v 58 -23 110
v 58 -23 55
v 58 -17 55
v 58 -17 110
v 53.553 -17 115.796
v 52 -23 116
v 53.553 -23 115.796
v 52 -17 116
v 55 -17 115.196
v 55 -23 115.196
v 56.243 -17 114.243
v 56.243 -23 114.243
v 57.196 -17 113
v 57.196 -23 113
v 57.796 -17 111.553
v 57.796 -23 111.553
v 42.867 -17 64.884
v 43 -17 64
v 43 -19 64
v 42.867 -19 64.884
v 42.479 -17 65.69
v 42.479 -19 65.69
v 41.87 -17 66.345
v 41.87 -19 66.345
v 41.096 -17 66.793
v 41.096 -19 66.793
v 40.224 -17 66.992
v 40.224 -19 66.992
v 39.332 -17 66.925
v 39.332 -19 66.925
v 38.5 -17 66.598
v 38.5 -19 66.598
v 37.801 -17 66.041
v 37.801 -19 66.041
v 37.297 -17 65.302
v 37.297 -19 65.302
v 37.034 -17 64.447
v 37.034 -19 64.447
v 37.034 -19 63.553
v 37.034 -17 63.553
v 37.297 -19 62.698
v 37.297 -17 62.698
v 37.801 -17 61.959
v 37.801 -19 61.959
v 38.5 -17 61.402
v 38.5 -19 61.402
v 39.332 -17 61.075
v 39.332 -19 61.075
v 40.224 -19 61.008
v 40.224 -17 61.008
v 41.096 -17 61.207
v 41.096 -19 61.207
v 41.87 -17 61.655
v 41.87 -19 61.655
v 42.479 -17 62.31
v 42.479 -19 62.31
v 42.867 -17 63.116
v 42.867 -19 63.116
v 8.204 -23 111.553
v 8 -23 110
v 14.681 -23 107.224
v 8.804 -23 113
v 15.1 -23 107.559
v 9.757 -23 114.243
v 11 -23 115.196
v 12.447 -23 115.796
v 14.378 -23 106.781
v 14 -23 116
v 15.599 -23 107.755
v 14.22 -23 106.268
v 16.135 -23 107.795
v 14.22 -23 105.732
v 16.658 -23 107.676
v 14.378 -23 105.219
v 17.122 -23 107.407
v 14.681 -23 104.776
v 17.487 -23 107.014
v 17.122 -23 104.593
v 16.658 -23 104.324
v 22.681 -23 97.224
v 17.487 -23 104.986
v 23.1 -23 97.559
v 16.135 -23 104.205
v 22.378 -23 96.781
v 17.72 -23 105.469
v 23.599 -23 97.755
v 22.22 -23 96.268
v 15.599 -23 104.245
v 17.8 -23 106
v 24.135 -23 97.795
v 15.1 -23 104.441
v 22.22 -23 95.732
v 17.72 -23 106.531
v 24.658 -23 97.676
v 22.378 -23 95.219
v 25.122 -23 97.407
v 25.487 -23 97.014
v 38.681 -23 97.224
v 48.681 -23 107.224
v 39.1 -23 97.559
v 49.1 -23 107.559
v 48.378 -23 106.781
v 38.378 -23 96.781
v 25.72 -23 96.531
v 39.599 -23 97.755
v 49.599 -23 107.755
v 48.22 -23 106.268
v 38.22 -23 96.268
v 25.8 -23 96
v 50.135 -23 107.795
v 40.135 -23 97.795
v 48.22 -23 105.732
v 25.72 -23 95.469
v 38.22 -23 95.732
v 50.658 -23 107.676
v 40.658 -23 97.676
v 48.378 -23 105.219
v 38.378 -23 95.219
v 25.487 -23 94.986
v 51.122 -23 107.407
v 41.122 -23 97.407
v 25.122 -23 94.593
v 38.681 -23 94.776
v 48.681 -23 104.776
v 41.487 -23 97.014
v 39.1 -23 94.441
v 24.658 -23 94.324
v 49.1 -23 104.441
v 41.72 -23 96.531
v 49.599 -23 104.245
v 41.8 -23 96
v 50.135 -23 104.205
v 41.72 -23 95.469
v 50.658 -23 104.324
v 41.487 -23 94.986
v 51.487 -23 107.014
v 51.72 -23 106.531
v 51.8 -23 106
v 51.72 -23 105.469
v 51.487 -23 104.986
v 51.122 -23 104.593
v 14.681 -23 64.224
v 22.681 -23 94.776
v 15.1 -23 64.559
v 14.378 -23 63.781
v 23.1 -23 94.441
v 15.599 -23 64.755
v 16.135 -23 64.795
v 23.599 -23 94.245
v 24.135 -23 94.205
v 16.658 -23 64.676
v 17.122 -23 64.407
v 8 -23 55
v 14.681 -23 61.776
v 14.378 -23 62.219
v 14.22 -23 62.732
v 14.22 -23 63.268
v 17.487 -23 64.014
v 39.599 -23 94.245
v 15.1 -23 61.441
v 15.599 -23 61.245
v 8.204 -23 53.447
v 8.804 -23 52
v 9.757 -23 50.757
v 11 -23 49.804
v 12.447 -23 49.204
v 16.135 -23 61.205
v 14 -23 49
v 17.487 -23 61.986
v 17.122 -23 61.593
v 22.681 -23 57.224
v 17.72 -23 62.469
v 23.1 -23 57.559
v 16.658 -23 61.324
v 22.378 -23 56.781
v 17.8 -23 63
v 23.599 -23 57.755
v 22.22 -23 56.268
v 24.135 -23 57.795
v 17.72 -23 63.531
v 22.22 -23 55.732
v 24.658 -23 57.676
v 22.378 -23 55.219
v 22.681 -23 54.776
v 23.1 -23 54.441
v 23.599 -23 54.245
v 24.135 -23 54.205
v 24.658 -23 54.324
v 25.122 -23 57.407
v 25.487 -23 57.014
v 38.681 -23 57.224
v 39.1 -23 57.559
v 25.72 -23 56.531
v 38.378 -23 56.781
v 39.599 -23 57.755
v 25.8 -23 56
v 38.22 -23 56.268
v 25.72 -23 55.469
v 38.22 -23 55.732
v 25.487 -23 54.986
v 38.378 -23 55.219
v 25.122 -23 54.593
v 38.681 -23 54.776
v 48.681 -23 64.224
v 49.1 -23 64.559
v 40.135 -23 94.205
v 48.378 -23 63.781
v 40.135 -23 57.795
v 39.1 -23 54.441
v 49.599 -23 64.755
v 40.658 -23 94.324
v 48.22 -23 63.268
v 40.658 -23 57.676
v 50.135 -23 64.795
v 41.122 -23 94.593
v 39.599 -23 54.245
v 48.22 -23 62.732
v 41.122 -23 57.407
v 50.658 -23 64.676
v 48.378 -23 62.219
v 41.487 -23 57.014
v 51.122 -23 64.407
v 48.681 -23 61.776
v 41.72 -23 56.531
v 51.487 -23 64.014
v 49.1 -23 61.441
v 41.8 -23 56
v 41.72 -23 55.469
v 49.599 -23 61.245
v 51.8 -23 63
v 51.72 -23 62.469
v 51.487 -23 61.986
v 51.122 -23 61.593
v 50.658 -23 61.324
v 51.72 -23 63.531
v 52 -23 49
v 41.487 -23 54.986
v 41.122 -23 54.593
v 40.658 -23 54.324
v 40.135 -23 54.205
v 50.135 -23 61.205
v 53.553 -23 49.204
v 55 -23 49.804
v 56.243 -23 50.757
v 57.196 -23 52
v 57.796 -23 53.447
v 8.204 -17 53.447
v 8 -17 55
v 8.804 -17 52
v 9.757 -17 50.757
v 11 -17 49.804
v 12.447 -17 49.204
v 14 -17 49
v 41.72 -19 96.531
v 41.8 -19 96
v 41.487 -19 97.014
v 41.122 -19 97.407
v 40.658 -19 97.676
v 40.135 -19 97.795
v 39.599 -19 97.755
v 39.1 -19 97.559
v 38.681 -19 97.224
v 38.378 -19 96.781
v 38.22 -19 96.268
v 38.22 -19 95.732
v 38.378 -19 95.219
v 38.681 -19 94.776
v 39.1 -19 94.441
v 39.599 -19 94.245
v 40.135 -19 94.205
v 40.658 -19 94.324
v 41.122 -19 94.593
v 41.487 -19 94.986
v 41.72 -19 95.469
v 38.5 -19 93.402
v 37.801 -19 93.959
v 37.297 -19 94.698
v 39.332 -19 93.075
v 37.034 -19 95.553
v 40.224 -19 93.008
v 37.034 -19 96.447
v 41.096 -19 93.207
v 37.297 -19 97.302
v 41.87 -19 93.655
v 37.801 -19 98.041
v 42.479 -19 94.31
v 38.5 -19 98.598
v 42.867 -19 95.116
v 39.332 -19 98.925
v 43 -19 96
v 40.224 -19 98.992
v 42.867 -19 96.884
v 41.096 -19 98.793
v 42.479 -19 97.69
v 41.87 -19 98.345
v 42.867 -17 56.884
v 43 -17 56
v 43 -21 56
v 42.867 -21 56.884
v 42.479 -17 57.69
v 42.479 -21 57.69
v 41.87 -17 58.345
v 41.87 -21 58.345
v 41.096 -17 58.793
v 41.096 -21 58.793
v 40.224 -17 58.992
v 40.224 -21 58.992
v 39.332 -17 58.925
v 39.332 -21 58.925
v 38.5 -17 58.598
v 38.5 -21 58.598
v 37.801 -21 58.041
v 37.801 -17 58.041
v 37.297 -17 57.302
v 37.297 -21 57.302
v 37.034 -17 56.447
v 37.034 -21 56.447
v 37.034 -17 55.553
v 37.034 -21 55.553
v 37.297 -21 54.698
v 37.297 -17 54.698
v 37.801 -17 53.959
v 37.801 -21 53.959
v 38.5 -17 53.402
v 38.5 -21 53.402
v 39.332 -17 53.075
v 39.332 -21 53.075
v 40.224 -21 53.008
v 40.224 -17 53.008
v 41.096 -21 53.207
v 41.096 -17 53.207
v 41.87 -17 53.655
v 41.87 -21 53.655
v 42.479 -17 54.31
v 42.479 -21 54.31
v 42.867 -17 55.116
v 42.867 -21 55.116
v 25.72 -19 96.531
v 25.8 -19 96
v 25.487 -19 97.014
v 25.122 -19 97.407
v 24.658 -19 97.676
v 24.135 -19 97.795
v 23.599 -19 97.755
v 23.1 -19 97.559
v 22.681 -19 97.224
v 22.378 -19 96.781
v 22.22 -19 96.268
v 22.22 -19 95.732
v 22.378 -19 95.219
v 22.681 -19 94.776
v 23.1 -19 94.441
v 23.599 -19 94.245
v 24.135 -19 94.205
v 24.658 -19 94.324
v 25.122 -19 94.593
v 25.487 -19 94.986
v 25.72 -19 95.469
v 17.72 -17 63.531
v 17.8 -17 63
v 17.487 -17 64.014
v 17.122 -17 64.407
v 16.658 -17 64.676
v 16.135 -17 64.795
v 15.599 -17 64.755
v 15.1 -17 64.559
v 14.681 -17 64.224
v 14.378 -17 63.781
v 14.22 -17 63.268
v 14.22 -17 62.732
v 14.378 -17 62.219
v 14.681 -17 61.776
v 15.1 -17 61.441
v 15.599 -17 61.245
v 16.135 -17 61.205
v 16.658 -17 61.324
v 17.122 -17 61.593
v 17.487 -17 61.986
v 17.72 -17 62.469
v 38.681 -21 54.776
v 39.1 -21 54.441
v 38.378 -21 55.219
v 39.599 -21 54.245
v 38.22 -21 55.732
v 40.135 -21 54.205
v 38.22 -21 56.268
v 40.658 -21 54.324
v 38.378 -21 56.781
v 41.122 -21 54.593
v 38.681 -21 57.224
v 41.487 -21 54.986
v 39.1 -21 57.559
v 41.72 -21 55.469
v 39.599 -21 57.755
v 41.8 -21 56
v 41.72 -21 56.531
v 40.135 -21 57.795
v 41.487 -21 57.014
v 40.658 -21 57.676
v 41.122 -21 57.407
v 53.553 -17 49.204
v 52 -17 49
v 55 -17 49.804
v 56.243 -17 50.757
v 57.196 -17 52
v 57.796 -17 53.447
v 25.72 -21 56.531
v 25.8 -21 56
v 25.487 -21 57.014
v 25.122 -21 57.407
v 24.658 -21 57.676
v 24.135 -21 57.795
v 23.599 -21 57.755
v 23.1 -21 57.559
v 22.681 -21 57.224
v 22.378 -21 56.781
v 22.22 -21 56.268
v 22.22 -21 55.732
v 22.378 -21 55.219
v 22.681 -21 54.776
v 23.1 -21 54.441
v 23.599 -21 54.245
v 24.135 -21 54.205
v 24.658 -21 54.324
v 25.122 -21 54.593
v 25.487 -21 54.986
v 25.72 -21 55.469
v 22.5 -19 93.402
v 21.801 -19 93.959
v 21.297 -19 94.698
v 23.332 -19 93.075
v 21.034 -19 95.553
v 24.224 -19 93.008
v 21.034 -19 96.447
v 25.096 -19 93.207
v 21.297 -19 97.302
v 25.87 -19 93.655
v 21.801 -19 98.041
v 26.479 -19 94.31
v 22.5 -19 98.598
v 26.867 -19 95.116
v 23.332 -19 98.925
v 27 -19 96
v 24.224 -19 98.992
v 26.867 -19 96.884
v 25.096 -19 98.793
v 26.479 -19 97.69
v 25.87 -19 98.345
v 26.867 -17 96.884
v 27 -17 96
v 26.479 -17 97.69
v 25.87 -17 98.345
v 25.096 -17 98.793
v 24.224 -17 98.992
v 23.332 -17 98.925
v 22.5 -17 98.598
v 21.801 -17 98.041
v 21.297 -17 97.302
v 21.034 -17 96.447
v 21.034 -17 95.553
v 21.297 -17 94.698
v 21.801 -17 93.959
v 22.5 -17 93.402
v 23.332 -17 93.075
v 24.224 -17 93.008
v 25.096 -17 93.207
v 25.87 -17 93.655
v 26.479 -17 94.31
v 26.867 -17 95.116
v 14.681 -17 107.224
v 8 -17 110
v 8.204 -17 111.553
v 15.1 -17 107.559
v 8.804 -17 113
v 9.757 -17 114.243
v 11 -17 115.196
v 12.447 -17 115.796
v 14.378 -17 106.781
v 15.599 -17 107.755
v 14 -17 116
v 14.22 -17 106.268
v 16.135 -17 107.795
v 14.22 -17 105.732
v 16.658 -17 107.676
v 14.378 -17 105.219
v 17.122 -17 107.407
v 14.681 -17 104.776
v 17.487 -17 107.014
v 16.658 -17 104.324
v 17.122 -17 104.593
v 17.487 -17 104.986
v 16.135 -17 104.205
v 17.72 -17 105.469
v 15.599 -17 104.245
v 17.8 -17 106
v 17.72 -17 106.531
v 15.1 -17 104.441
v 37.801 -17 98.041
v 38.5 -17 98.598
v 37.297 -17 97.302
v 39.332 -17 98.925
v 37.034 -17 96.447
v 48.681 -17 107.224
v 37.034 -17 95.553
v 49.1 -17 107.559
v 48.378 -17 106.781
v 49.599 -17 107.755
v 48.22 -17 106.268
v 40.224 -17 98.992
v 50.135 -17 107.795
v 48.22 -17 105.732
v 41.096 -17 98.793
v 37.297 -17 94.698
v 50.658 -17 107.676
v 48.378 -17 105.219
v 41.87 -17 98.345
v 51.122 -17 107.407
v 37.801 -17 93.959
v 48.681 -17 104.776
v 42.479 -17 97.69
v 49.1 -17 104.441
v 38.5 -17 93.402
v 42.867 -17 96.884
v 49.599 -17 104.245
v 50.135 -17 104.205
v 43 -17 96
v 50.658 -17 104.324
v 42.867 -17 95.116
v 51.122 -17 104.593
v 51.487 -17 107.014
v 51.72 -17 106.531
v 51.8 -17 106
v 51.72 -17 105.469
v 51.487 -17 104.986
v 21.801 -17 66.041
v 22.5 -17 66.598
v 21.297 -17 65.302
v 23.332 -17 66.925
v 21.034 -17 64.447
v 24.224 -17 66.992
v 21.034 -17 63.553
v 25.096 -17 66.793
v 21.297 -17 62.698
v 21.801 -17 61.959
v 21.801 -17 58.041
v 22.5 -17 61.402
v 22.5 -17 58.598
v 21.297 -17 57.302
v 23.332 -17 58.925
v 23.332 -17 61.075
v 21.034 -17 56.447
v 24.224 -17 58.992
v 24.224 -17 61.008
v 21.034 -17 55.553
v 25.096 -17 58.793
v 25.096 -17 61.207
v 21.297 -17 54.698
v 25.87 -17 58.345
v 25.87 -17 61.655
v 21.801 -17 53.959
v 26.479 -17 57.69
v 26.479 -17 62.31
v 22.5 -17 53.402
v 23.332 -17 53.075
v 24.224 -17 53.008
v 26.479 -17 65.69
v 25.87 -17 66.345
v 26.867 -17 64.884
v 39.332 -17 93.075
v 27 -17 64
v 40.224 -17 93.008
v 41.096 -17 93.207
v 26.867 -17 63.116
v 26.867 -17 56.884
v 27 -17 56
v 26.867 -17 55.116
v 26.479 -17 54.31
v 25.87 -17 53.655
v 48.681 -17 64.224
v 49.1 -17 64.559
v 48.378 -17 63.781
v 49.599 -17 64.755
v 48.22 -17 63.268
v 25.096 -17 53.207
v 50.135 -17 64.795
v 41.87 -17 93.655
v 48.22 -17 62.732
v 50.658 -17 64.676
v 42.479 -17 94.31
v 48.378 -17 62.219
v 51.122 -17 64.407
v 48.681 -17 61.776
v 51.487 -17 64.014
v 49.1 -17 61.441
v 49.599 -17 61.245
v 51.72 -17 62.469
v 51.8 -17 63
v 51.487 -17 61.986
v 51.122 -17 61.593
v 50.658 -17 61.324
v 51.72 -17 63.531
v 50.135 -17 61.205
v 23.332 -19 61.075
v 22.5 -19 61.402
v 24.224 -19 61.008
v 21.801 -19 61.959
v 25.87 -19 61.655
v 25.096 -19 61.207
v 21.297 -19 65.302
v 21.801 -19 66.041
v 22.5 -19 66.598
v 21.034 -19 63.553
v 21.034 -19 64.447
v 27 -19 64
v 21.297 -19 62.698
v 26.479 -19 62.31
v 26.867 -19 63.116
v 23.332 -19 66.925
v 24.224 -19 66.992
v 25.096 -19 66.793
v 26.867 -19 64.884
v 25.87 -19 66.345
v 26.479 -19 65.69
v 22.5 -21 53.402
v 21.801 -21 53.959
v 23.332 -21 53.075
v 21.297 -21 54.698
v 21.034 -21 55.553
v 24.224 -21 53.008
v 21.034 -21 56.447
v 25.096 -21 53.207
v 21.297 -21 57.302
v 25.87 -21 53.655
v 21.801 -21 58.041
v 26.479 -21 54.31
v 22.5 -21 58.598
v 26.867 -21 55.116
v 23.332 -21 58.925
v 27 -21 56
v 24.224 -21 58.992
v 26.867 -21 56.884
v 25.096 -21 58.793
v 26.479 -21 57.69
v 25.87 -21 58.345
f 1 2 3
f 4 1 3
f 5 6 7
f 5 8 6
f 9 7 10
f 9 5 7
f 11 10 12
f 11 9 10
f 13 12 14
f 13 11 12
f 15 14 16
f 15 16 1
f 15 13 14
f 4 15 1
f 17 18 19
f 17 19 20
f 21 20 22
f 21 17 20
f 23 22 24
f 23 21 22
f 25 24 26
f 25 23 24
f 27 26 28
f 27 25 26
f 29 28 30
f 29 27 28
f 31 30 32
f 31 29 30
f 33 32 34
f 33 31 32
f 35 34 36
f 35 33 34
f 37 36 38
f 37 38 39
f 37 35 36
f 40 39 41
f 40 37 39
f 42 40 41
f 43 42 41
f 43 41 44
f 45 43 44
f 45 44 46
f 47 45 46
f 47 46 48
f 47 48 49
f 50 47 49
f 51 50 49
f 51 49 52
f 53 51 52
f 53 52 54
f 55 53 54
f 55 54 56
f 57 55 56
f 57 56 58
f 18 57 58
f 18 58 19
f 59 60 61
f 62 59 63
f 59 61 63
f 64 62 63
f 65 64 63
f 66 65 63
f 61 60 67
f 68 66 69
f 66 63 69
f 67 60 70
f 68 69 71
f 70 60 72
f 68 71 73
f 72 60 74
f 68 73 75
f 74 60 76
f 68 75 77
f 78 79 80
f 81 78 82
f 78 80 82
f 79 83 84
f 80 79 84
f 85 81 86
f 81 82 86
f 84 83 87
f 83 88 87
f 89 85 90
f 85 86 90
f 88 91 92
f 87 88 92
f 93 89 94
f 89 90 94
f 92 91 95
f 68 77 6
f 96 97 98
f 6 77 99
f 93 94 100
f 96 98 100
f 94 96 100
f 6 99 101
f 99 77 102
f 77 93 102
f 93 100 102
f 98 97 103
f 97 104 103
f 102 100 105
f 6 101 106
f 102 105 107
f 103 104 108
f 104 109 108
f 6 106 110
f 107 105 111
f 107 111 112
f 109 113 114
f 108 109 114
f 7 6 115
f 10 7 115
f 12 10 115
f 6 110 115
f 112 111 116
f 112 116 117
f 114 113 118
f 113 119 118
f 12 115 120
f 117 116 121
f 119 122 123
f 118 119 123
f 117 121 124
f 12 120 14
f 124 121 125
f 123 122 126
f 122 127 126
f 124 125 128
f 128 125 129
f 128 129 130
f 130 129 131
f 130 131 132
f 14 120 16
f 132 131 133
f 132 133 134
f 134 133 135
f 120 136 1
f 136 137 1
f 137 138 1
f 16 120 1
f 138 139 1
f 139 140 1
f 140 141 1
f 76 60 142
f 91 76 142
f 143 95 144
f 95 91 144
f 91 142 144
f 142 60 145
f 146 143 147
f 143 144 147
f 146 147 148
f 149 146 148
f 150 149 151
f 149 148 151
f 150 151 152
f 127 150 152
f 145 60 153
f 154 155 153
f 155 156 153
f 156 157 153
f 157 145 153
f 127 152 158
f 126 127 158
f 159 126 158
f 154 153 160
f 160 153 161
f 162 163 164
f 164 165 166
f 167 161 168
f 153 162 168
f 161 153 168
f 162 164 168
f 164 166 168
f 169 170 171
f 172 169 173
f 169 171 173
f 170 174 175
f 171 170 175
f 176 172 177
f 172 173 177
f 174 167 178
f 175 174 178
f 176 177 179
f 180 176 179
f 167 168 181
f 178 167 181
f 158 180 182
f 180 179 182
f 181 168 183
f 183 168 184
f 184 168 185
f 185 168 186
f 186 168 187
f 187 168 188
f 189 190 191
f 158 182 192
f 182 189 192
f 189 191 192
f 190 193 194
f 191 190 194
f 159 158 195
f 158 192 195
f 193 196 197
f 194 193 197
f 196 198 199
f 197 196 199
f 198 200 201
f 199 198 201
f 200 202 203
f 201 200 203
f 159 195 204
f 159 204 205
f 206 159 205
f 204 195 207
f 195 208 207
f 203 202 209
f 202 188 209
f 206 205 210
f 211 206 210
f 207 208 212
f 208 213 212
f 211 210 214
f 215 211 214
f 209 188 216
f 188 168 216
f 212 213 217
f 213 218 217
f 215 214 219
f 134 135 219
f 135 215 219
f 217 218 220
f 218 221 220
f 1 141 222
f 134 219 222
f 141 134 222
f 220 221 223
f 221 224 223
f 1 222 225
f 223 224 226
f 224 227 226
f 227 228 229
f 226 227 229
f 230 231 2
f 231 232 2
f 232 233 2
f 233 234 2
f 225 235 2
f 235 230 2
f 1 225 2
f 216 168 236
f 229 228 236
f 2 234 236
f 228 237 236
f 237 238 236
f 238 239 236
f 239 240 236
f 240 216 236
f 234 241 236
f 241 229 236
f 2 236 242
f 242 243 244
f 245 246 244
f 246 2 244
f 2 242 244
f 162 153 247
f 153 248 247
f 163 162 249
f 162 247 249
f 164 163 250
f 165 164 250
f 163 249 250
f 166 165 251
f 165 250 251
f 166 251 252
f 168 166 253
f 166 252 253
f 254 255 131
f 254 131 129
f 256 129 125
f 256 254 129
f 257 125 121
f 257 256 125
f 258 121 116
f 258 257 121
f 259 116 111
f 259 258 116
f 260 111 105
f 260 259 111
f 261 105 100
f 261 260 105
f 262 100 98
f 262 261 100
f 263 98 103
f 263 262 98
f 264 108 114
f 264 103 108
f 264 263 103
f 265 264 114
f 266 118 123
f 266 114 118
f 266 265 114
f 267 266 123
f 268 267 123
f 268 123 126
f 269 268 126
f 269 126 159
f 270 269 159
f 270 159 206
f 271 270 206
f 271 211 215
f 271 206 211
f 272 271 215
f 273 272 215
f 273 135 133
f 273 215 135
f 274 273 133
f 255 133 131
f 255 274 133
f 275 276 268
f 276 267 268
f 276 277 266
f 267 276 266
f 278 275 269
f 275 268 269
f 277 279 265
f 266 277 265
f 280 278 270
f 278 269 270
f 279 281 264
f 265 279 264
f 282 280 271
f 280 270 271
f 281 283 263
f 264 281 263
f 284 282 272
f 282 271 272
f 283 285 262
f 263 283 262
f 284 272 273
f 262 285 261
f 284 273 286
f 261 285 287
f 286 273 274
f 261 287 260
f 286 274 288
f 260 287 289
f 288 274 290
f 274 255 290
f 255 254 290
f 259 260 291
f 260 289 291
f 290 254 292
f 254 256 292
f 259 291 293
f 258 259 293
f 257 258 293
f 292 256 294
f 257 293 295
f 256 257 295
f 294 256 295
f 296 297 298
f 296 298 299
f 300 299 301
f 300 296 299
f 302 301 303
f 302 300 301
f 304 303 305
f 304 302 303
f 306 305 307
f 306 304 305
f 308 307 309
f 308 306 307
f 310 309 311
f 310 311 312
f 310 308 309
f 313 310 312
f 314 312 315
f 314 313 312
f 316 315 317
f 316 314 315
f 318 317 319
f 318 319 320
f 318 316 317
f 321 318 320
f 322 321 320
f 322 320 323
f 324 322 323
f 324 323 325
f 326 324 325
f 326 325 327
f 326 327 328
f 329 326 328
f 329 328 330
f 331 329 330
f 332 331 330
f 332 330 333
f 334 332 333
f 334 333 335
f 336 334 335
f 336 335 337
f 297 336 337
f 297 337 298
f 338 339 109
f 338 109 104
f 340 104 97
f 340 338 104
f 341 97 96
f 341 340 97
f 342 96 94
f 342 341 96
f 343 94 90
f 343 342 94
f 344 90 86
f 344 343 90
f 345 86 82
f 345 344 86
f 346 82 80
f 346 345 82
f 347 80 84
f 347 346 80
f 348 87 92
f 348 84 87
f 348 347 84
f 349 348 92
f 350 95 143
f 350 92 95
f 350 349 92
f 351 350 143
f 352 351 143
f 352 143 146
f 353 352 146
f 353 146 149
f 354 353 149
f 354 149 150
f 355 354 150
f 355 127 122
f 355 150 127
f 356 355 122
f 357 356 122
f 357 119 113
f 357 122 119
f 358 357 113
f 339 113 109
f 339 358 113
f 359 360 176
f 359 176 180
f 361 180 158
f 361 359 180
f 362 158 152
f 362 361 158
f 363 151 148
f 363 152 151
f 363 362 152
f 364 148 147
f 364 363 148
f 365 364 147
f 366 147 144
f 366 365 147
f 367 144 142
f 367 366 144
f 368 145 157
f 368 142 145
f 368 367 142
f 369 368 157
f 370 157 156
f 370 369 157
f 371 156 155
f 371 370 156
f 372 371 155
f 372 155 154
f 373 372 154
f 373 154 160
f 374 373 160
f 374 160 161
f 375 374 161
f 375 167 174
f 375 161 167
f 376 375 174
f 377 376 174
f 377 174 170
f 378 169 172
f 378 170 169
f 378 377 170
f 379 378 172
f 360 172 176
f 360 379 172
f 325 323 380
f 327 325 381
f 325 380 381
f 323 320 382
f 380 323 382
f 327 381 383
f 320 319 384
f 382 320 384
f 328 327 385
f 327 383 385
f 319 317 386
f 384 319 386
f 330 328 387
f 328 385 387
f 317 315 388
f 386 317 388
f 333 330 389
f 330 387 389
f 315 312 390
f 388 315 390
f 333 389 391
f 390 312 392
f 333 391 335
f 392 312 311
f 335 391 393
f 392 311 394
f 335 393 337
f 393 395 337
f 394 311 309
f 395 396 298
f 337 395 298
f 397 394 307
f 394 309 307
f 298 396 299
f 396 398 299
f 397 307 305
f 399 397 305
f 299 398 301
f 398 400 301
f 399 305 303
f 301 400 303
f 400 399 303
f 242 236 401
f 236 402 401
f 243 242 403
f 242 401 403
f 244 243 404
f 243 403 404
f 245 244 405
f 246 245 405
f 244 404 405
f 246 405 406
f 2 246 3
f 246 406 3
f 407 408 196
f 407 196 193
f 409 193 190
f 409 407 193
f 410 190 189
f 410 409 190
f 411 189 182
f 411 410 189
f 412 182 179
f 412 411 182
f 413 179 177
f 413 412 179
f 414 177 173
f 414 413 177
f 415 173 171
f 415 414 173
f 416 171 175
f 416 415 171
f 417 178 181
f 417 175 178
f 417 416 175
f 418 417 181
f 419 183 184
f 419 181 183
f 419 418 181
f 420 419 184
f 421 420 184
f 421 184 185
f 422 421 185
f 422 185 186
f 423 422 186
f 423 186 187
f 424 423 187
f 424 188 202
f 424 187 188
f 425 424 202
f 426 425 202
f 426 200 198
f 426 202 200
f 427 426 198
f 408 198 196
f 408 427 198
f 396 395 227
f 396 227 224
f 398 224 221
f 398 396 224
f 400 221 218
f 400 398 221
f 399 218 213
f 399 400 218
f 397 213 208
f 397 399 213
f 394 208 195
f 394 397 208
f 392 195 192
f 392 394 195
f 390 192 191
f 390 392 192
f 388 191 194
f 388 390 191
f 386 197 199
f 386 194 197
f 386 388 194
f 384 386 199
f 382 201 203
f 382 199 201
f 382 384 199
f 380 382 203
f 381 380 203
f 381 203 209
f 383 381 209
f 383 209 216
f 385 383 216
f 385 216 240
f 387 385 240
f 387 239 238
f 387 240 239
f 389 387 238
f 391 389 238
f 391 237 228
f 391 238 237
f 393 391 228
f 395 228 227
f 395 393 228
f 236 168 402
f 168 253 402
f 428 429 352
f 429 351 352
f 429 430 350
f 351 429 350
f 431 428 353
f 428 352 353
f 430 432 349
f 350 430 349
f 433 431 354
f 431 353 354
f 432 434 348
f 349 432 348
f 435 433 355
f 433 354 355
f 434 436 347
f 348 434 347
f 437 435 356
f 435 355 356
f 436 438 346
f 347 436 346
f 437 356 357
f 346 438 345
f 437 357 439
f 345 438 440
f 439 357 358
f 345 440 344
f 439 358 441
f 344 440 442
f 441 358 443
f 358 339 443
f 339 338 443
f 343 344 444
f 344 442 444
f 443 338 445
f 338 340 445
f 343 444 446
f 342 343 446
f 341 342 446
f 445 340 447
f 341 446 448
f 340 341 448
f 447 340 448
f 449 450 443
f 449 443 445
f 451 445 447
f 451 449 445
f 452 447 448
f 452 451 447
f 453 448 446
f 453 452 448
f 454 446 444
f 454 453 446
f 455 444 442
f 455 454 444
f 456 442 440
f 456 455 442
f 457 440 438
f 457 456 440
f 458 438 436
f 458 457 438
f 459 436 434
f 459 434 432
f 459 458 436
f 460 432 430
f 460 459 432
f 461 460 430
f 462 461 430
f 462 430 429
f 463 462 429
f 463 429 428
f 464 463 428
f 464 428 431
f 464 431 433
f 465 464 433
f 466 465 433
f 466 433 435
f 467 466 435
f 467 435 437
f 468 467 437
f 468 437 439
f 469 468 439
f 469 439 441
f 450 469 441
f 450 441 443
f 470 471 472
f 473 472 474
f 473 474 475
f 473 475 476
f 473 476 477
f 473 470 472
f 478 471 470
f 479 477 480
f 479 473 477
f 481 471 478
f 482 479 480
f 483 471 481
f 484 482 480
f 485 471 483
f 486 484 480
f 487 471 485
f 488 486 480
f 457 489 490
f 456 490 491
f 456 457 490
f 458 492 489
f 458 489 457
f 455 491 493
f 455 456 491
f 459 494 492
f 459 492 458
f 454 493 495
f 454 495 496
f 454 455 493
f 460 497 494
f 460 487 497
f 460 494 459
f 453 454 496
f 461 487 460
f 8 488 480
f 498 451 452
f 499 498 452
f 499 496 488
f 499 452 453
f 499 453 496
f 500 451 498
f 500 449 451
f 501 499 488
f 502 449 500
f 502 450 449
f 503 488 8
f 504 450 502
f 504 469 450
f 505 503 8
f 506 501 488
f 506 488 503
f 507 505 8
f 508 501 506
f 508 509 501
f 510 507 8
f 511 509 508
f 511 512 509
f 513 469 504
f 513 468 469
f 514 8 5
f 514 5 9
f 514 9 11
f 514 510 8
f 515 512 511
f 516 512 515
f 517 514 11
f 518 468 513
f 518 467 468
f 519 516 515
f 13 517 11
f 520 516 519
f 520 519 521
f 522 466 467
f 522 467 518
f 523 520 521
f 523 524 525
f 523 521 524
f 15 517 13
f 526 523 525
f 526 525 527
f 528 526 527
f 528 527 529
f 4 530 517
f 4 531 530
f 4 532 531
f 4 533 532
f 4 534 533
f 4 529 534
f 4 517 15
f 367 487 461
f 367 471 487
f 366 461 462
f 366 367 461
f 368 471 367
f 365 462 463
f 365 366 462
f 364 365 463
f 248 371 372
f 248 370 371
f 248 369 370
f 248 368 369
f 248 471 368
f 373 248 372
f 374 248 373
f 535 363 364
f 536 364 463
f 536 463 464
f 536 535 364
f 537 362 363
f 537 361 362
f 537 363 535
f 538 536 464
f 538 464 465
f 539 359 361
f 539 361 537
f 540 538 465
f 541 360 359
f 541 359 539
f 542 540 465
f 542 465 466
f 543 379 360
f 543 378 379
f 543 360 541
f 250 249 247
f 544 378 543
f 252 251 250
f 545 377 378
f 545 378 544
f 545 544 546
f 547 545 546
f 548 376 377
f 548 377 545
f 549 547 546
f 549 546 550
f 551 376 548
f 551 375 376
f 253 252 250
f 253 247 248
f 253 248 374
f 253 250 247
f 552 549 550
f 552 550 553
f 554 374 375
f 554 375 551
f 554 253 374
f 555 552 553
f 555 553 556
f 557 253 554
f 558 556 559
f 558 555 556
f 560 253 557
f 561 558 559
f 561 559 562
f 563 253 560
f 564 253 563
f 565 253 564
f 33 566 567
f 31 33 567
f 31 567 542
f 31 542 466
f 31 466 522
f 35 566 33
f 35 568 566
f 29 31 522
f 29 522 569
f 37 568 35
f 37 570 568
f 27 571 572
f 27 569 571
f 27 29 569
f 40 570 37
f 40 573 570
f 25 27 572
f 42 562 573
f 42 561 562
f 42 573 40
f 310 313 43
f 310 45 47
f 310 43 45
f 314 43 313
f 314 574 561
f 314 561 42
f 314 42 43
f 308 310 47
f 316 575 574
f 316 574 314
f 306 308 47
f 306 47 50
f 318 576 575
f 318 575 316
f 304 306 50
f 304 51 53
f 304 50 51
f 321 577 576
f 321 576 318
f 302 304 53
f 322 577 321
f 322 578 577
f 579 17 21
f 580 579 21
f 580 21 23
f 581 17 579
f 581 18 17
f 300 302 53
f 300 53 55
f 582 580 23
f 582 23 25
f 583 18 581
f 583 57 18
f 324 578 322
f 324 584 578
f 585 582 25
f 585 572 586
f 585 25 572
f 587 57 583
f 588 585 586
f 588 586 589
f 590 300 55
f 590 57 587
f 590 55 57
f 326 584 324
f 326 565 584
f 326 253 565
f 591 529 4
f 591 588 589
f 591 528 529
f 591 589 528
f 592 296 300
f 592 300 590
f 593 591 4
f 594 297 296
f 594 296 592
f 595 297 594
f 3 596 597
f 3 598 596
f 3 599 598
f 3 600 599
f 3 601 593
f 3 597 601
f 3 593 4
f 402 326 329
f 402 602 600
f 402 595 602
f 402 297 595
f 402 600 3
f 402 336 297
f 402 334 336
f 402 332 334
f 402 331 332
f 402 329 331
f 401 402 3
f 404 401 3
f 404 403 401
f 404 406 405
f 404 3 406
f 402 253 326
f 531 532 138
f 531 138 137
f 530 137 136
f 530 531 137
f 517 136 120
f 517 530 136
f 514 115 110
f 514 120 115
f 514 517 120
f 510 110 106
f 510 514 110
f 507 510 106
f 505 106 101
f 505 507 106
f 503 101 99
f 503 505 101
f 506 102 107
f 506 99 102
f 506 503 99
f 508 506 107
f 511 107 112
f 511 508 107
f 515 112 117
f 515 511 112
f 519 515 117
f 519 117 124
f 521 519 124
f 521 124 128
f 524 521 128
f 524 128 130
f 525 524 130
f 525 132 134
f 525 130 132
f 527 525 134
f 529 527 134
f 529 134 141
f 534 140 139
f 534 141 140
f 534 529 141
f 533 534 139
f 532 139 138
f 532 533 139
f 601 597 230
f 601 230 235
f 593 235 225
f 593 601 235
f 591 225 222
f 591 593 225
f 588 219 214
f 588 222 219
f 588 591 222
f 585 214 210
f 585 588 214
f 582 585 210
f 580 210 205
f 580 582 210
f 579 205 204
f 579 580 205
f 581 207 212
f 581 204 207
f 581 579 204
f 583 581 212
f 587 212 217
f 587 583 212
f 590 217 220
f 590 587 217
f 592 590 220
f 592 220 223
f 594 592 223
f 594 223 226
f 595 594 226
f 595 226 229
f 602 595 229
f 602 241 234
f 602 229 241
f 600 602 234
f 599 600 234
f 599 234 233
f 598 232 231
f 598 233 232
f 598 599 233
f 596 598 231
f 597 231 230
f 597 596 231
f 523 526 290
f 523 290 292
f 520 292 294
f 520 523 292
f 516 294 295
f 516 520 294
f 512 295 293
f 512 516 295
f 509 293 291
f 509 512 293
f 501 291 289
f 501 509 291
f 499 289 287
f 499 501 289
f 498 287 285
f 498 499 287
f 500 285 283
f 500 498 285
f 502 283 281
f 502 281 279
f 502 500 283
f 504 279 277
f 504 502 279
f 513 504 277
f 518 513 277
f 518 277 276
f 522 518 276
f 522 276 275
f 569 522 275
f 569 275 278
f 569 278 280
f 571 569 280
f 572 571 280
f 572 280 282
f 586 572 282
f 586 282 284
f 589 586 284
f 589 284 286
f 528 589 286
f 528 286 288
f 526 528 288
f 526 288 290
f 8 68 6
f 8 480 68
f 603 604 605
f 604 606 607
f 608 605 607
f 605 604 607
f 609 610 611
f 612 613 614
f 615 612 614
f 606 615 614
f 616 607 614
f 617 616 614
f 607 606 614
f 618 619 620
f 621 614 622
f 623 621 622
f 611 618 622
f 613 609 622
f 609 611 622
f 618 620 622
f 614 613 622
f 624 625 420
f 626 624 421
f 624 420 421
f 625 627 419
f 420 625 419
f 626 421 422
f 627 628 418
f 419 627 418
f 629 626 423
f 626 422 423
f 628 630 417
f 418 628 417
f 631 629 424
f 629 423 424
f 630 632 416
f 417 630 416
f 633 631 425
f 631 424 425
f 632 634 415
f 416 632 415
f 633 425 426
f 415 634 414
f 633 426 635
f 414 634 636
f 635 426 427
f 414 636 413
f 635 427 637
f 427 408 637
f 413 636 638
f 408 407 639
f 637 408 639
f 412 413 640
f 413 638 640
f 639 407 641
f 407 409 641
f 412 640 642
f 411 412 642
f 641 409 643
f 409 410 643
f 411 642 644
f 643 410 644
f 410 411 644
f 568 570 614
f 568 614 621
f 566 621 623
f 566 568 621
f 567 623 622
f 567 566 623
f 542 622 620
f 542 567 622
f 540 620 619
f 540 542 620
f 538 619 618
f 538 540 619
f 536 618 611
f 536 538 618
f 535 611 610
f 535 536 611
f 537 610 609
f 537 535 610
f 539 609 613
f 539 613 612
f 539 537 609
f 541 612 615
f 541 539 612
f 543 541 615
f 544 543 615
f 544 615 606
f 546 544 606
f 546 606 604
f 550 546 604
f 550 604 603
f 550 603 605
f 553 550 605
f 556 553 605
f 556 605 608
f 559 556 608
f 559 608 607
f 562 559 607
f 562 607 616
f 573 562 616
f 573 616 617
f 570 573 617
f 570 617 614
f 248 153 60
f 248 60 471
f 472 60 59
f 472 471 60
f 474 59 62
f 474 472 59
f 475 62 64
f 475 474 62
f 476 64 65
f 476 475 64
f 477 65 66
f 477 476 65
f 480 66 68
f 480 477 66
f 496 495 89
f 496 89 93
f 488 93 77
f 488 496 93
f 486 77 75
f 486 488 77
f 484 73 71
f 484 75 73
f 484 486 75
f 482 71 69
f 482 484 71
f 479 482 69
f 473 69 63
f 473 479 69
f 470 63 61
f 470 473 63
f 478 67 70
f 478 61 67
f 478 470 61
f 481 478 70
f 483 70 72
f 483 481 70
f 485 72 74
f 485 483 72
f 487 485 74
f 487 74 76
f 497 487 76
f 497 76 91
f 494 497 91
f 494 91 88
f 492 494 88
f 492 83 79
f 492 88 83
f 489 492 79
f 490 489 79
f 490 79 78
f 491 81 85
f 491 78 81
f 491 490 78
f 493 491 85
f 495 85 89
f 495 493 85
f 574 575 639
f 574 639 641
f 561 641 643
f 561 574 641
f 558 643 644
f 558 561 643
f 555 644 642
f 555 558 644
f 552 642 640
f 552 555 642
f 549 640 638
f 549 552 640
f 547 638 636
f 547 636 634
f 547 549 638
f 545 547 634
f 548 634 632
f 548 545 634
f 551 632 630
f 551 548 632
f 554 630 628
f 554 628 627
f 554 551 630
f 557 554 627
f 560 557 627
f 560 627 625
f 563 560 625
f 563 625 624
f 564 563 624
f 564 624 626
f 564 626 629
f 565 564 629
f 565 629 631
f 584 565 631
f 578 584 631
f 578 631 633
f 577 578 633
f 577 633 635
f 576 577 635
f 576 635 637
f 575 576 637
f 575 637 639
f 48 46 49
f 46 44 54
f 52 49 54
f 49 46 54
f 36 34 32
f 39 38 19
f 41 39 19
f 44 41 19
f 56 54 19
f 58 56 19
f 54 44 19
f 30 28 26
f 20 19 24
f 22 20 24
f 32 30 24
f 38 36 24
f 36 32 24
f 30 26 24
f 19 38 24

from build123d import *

# Parameters (mm, degrees)
CYLINDER135_R          = 1.8
CYLINDER135_DEPTH      = 34
CYLINDER135_ROLL_ANGLE = 90
CYLINDER134_R          = 1.8
CYLINDER134_DEPTH      = 34
CYLINDER134_ROLL_ANGLE = 90
CYLINDER137_R          = 3
CYLINDER137_DEPTH      = 34
CYLINDER137_ROLL_ANGLE = 90
CYLINDER136_R          = 3
CYLINDER136_DEPTH      = 34
CYLINDER136_ROLL_ANGLE = 90
CYLINDER123_R          = 1.8
CYLINDER123_DEPTH      = 34
CYLINDER123_ROLL_ANGLE = 90
CYLINDER122_R          = 1.8
CYLINDER122_DEPTH      = 34
CYLINDER122_ROLL_ANGLE = 90
CYLINDER125_R          = 1.8
CYLINDER125_DEPTH      = 34
CYLINDER125_ROLL_ANGLE = 90
CYLINDER124_R          = 1.8
CYLINDER124_DEPTH      = 34
CYLINDER124_ROLL_ANGLE = 90
CYLINDER127_R          = 3
CYLINDER127_DEPTH      = 34
CYLINDER127_ROLL_ANGLE = 90
CYLINDER126_R          = 3
CYLINDER126_DEPTH      = 34
CYLINDER126_ROLL_ANGLE = 90
CYLINDER129_R          = 3
CYLINDER129_DEPTH      = 34
CYLINDER129_ROLL_ANGLE = 90
CYLINDER128_R          = 3
CYLINDER128_DEPTH      = 34
CYLINDER128_ROLL_ANGLE = 90
CYLINDER131_R          = 1.8
CYLINDER131_DEPTH      = 34
CYLINDER131_ROLL_ANGLE = 90
CYLINDER130_R          = 1.8
CYLINDER130_DEPTH      = 34
CYLINDER130_ROLL_ANGLE = 90
CYLINDER133_R          = 1.8
CYLINDER133_DEPTH      = 34
CYLINDER133_ROLL_ANGLE = 90
CYLINDER132_R          = 1.8
CYLINDER132_DEPTH      = 34
CYLINDER132_ROLL_ANGLE = 90
BOX061_W               = 50
BOX061_H               = 6
BOX061_DEPTH           = 67
FILLET055_R            = 6


with BuildPart() as cilindro089:
    # Cylinder135 → Cylinder135 (new body)
    with BuildSketch(Plane.XY):
        Circle(CYLINDER135_R)
    extrude(amount=CYLINDER135_DEPTH)


with BuildPart() as cilindro089_1:
    # Cylinder135 roll: moved
    add(cilindro089.part.rotate(Axis((0, 0, 0), (1, 0, 0)), CYLINDER135_ROLL_ANGLE))


with BuildPart() as cilindro089_2:
    # Cylinder135 placement: moved
    add(cilindro089_1.part.moved(Location((24, -10, 64))))


with BuildPart() as fusion079:
    # Cylinder134 → Cylinder134 (new body)
    with BuildSketch(Plane.XY):
        Circle(CYLINDER134_R)
    extrude(amount=CYLINDER134_DEPTH)


with BuildPart() as fusion079_1:
    # Cylinder134 roll: moved
    add(fusion079.part.rotate(Axis((0, 0, 0), (1, 0, 0)), CYLINDER134_ROLL_ANGLE))


with BuildPart() as fusion079_2:
    # Cylinder134 placement: moved
    add(fusion079_1.part.moved(Location((40, -10, 64))))

    # Fusion079: union Cilindro089
    add(cilindro089_2.part)


with BuildPart() as fusion079_3:
    # Fusion079 placement: moved
    add(fusion079_2.part.moved(Location((0, 0, -8))))


with BuildPart() as cilindro091:
    # Cylinder137 → Cylinder137 (new body)
    with BuildSketch(Plane.XY):
        Circle(CYLINDER137_R)
    extrude(amount=CYLINDER137_DEPTH)


with BuildPart() as cilindro091_1:
    # Cylinder137 roll: moved
    add(cilindro091.part.rotate(Axis((0, 0, 0), (1, 0, 0)), CYLINDER137_ROLL_ANGLE))


with BuildPart() as cilindro091_2:
    # Cylinder137 placement: moved
    add(cilindro091_1.part.moved(Location((24, -10, 64))))


with BuildPart() as fusion080:
    # Cylinder136 → Cylinder136 (new body)
    with BuildSketch(Plane.XY):
        Circle(CYLINDER136_R)
    extrude(amount=CYLINDER136_DEPTH)


with BuildPart() as fusion080_1:
    # Cylinder136 roll: moved
    add(fusion080.part.rotate(Axis((0, 0, 0), (1, 0, 0)), CYLINDER136_ROLL_ANGLE))


with BuildPart() as fusion080_2:
    # Cylinder136 placement: moved
    add(fusion080_1.part.moved(Location((40, -10, 64))))

    # Fusion080: union Cilindro091
    add(cilindro091_2.part)


with BuildPart() as fusion080_3:
    # Fusion080 placement: moved
    add(fusion080_2.part.moved(Location((0, 23, -8))))


with BuildPart() as cilindro077:
    # Cylinder123 → Cylinder123 (new body)
    with BuildSketch(Plane.XY):
        Circle(CYLINDER123_R)
    extrude(amount=CYLINDER123_DEPTH)


with BuildPart() as cilindro077_1:
    # Cylinder123 roll: moved
    add(cilindro077.part.rotate(Axis((0, 0, 0), (1, 0, 0)), CYLINDER123_ROLL_ANGLE))


with BuildPart() as cilindro077_2:
    # Cylinder123 placement: moved
    add(cilindro077_1.part.moved(Location((24, -10, 64))))


with BuildPart() as fusion070:
    # Cylinder122 → Cylinder122 (new body)
    with BuildSketch(Plane.XY):
        Circle(CYLINDER122_R)
    extrude(amount=CYLINDER122_DEPTH)


with BuildPart() as fusion070_1:
    # Cylinder122 roll: moved
    add(fusion070.part.rotate(Axis((0, 0, 0), (1, 0, 0)), CYLINDER122_ROLL_ANGLE))


with BuildPart() as fusion070_2:
    # Cylinder122 placement: moved
    add(fusion070_1.part.moved(Location((40, -10, 64))))

    # Fusion070: union Cilindro077
    add(cilindro077_2.part)


with BuildPart() as fusion070_3:
    # Fusion070 placement: moved
    add(fusion070_2.part.moved(Location((0, 0, -8))))


with BuildPart() as cilindro079:
    # Cylinder125 → Cylinder125 (new body)
    with BuildSketch(Plane.XY):
        Circle(CYLINDER125_R)
    extrude(amount=CYLINDER125_DEPTH)


with BuildPart() as cilindro079_1:
    # Cylinder125 roll: moved
    add(cilindro079.part.rotate(Axis((0, 0, 0), (1, 0, 0)), CYLINDER125_ROLL_ANGLE))


with BuildPart() as cilindro079_2:
    # Cylinder125 placement: moved
    add(cilindro079_1.part.moved(Location((24, -10, 61))))


with BuildPart() as fusion072:
    # Cylinder124 → Cylinder124 (new body)
    with BuildSketch(Plane.XY):
        Circle(CYLINDER124_R)
    extrude(amount=CYLINDER124_DEPTH)


with BuildPart() as fusion072_1:
    # Cylinder124 roll: moved
    add(fusion072.part.rotate(Axis((0, 0, 0), (1, 0, 0)), CYLINDER124_ROLL_ANGLE))


with BuildPart() as fusion072_2:
    # Cylinder124 placement: moved
    add(fusion072_1.part.moved(Location((40, -10, 61))))

    # Fusion071: union Cilindro079
    add(cilindro079_2.part)


with BuildPart() as fusion072_3:
    # Fusion071 placement: moved
    add(fusion072_2.part.moved(Location((0, 0, 35))))

    # Fusion072: union Fusion070
    add(fusion070_3.part)


with BuildPart() as cilindro081:
    # Cylinder127 → Cylinder127 (new body)
    with BuildSketch(Plane.XY):
        Circle(CYLINDER127_R)
    extrude(amount=CYLINDER127_DEPTH)


with BuildPart() as cilindro081_1:
    # Cylinder127 roll: moved
    add(cilindro081.part.rotate(Axis((0, 0, 0), (1, 0, 0)), CYLINDER127_ROLL_ANGLE))


with BuildPart() as cilindro081_2:
    # Cylinder127 placement: moved
    add(cilindro081_1.part.moved(Location((24, -10, 64))))


with BuildPart() as fusion073:
    # Cylinder126 → Cylinder126 (new body)
    with BuildSketch(Plane.XY):
        Circle(CYLINDER126_R)
    extrude(amount=CYLINDER126_DEPTH)


with BuildPart() as fusion073_1:
    # Cylinder126 roll: moved
    add(fusion073.part.rotate(Axis((0, 0, 0), (1, 0, 0)), CYLINDER126_ROLL_ANGLE))


with BuildPart() as fusion073_2:
    # Cylinder126 placement: moved
    add(fusion073_1.part.moved(Location((40, -10, 64))))

    # Fusion073: union Cilindro081
    add(cilindro081_2.part)


with BuildPart() as cilindro083:
    # Cylinder129 → Cylinder129 (new body)
    with BuildSketch(Plane.XY):
        Circle(CYLINDER129_R)
    extrude(amount=CYLINDER129_DEPTH)


with BuildPart() as cilindro083_1:
    # Cylinder129 roll: moved
    add(cilindro083.part.rotate(Axis((0, 0, 0), (1, 0, 0)), CYLINDER129_ROLL_ANGLE))


with BuildPart() as cilindro083_2:
    # Cylinder129 placement: moved
    add(cilindro083_1.part.moved(Location((24, -10, 61))))


with BuildPart() as fusion075:
    # Cylinder128 → Cylinder128 (new body)
    with BuildSketch(Plane.XY):
        Circle(CYLINDER128_R)
    extrude(amount=CYLINDER128_DEPTH)


with BuildPart() as fusion075_1:
    # Cylinder128 roll: moved
    add(fusion075.part.rotate(Axis((0, 0, 0), (1, 0, 0)), CYLINDER128_ROLL_ANGLE))


with BuildPart() as fusion075_2:
    # Cylinder128 placement: moved
    add(fusion075_1.part.moved(Location((40, -10, 61))))

    # Fusion074: union Cilindro083
    add(cilindro083_2.part)


with BuildPart() as fusion075_3:
    # Fusion074 placement: moved
    add(fusion075_2.part.moved(Location((0, 0, 35))))

    # Fusion075: union Fusion073
    add(fusion073_2.part)


with BuildPart() as fusion075_4:
    # Fusion075 placement: moved
    add(fusion075_3.part.moved(Location((0, 25, 0))))


with BuildPart() as cilindro085:
    # Cylinder131 → Cylinder131 (new body)
    with BuildSketch(Plane.XY):
        Circle(CYLINDER131_R)
    extrude(amount=CYLINDER131_DEPTH)


with BuildPart() as cilindro085_1:
    # Cylinder131 roll: moved
    add(cilindro085.part.rotate(Axis((0, 0, 0), (1, 0, 0)), CYLINDER131_ROLL_ANGLE))


with BuildPart() as cilindro085_2:
    # Cylinder131 placement: moved
    add(cilindro085_1.part.moved(Location((16, -10, 63))))


with BuildPart() as fusion076:
    # Cylinder130 → Cylinder130 (new body)
    with BuildSketch(Plane.XY):
        Circle(CYLINDER130_R)
    extrude(amount=CYLINDER130_DEPTH)


with BuildPart() as fusion076_1:
    # Cylinder130 roll: moved
    add(fusion076.part.rotate(Axis((0, 0, 0), (1, 0, 0)), CYLINDER130_ROLL_ANGLE))


with BuildPart() as fusion076_2:
    # Cylinder130 placement: moved
    add(fusion076_1.part.moved(Location((50, -10, 63))))

    # Fusion076: union Cilindro085
    add(cilindro085_2.part)


with BuildPart() as cilindro087:
    # Cylinder133 → Cylinder133 (new body)
    with BuildSketch(Plane.XY):
        Circle(CYLINDER133_R)
    extrude(amount=CYLINDER133_DEPTH)


with BuildPart() as cilindro087_1:
    # Cylinder133 roll: moved
    add(cilindro087.part.rotate(Axis((0, 0, 0), (1, 0, 0)), CYLINDER133_ROLL_ANGLE))


with BuildPart() as cilindro087_2:
    # Cylinder133 placement: moved
    add(cilindro087_1.part.moved(Location((16, -10, 63))))


with BuildPart() as fusion078:
    # Cylinder132 → Cylinder132 (new body)
    with BuildSketch(Plane.XY):
        Circle(CYLINDER132_R)
    extrude(amount=CYLINDER132_DEPTH)


with BuildPart() as fusion078_1:
    # Cylinder132 roll: moved
    add(fusion078.part.rotate(Axis((0, 0, 0), (1, 0, 0)), CYLINDER132_ROLL_ANGLE))


with BuildPart() as fusion078_2:
    # Cylinder132 placement: moved
    add(fusion078_1.part.moved(Location((50, -10, 63))))

    # Fusion077: union Cilindro087
    add(cilindro087_2.part)


with BuildPart() as fusion078_3:
    # Fusion077 placement: moved
    add(fusion078_2.part.moved(Location((0, 0, 43))))

    # Fusion078: union Fusion076
    add(fusion076_2.part)


with BuildPart() as fillet055:
    # Box061 → Box061 (new body)
    with BuildSketch(Plane(origin=(8, -23, 49), x_dir=(1, 0, 0), z_dir=(0, 0, 1))):
        with Locations((25, 3)):
            Rectangle(BOX061_W, BOX061_H)
    extrude(amount=BOX061_DEPTH)

    # Cut140: cut Fusion078
    add(fusion078_3.part, mode=Mode.SUBTRACT)

    # Cut141: cut Fusion075
    add(fusion075_4.part, mode=Mode.SUBTRACT)

    # Cut142: cut Fusion072
    add(fusion072_3.part, mode=Mode.SUBTRACT)

    # Cut143: cut Fusion080
    add(fusion080_3.part, mode=Mode.SUBTRACT)

    # Cut144: cut Fusion079
    add(fusion079_3.part, mode=Mode.SUBTRACT)

    # Fillet055
    fillet055_edges = [fillet055.edges().sort_by_distance(p)[0] for p in [
        (8, -20, 116),
        (8, -20, 49),
        (58, -20, 116),
        (58, -20, 49),
    ]]
    fillet(fillet055_edges, radius=FILLET055_R)


solid = fillet055.part
